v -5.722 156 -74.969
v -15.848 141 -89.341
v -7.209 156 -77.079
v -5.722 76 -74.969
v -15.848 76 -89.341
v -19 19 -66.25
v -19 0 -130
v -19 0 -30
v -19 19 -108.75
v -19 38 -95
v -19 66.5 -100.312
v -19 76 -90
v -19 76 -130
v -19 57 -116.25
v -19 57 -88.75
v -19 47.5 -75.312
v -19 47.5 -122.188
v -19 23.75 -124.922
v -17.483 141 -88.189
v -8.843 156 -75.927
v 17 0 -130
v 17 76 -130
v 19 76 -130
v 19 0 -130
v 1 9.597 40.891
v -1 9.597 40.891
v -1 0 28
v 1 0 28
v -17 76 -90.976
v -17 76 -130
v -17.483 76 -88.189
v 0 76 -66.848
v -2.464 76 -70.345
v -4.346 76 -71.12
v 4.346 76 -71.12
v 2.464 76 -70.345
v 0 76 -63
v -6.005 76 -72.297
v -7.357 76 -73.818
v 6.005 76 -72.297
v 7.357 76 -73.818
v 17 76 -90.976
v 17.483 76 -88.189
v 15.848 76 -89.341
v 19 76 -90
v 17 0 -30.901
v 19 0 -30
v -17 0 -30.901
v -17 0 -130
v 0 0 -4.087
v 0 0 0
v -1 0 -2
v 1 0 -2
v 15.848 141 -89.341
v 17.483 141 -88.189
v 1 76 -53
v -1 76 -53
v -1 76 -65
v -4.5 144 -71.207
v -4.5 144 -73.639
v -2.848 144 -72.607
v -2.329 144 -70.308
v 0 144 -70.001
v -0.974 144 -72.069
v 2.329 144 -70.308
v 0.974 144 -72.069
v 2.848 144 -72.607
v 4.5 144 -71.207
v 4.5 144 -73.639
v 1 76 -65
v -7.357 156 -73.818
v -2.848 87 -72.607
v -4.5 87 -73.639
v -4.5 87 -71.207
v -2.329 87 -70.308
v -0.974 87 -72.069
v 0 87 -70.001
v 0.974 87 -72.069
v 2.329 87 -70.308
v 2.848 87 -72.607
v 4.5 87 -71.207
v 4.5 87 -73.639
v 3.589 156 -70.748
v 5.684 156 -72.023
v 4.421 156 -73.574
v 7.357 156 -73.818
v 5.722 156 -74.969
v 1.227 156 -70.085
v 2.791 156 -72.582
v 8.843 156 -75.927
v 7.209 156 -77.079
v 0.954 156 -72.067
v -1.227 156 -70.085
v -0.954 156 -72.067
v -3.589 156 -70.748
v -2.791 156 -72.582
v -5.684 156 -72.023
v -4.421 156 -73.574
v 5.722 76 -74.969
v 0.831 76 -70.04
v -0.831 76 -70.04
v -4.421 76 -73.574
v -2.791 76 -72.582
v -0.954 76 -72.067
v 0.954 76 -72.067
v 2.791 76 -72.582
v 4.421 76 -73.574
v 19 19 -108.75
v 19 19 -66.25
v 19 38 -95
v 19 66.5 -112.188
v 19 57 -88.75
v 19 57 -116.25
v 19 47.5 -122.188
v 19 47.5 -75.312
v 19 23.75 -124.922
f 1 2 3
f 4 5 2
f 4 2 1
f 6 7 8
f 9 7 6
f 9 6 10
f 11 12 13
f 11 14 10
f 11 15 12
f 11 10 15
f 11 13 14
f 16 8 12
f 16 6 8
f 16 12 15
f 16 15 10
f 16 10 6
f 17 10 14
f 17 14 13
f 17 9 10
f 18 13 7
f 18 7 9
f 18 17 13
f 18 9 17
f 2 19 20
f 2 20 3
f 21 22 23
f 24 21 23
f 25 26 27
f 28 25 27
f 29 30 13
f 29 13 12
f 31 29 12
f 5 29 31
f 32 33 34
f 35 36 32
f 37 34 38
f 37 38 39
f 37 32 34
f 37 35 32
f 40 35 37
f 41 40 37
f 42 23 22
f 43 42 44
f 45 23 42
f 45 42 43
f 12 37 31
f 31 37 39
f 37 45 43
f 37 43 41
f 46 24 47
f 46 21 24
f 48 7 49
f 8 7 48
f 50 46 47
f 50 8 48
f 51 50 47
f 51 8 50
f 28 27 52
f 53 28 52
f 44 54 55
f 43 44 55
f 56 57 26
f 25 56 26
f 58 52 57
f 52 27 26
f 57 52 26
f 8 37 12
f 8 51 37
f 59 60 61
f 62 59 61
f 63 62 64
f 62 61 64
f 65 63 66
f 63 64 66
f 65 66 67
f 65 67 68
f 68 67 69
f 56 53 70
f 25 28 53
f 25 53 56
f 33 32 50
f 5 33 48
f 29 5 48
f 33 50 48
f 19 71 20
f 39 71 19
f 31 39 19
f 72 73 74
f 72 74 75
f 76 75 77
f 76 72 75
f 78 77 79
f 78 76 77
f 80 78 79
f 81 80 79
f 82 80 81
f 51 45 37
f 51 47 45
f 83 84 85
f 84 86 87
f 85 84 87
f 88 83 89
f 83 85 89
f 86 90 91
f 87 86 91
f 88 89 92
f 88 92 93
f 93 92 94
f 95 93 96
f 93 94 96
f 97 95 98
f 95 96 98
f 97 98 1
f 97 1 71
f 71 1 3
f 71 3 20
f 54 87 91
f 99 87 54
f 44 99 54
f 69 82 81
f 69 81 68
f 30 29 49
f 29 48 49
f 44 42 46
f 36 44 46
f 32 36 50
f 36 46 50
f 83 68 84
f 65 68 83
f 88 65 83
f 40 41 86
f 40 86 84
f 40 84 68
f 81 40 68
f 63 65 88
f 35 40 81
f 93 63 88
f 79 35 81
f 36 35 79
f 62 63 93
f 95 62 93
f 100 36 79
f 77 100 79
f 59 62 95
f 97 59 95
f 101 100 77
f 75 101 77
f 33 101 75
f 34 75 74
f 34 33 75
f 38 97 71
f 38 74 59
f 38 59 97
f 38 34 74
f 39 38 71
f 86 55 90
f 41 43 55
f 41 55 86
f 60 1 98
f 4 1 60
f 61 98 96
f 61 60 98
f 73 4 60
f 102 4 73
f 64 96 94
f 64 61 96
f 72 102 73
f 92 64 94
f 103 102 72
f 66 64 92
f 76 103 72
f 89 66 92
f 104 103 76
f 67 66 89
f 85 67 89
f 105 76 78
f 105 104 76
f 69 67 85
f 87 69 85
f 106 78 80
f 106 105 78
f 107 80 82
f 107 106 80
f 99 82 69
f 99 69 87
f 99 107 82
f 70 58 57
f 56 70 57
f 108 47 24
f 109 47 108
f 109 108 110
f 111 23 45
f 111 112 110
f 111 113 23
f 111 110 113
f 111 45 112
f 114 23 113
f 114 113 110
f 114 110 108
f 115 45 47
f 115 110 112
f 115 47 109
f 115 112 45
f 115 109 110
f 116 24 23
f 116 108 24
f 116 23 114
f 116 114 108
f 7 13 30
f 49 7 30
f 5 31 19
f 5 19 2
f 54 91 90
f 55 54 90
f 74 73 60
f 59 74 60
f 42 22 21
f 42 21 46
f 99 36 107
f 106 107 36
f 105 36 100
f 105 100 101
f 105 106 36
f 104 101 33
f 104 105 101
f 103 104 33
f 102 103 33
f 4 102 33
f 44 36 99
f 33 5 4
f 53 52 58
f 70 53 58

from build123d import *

# Parameters (mm, degrees)
SHELL_1_T                = -2
EXTRUDE_1_DEPTH          = 1
EXTRUDE_1_DEPTH_BACK     = 1
MOVE_START               = -1
MOVE_FACE_1_DEPTH        = 2
EXTRUDE_2_DEPTH          = 80
CHAMFER_1_SIZE           = 15
CUT_EXTRUDE_1_DEPTH      = 204.953426129
CUT_EXTRUDE_1_DEPTH_BACK = 204.953426129
SKETCH_5_W               = 9
SKETCH_5_H               = 57


# Read off the part's stored shape, not the designer's step: Переместить грань1
with BuildPart() as part:
    # Эскиз2 → По сечениям2 section 0
    with BuildSketch(Plane(origin=(0, 76, 0), x_dir=(1, 0, 0), z_dir=(0, 1, 0))):
        with BuildLine():
            Line((-19, 130), (19, 130))
            Line((19, 130), (19, 90))
            Line((19, 90), (0, 63))
            Line((0, 63), (-19, 90))
            Line((-19, 90), (-19, 130))
        make_face()
    # Эскиз1 → По сечениям2 section 1
    with BuildSketch(Plane(origin=(0, 0, 0), x_dir=(1, 0, 0), z_dir=(0, 1, 0))):
        with BuildLine():
            Line((0, 0), (19, 30))
            Line((19, 30), (19, 130))
            Line((19, 130), (-19, 130))
            Line((-19, 130), (-19, 30))
            Line((-19, 30), (0, 0))
        make_face()
    loft()

    # Оболочка1
    shell_1_openings = [part.faces().sort_by_distance(p)[0] for p in [
        (0, 0, -72.173913043),
        (0, 76, -102.682242991),
        (0, 38, -130),
    ]]
    offset(amount=SHELL_1_T, openings=shell_1_openings, kind=Kind.INTERSECTION)

    # Эскиз4 → Бобышка-Вытянуть2 (add)
    with BuildSketch(Plane(origin=(0, 76, 0), x_dir=(1, 0, 0), z_dir=(0, 1, 0))):
        with BuildLine():
            Line((5.722299686, 74.96948221), (15.84807873, 89.340970111))
            Line((15.84807873, 89.340970111), (17.483021498, 88.189031681))
            Line((17.483021498, 88.189031681), (7.357242454, 73.81754378))
            ThreePointArc((7.357242454, 73.81754378), (0, 70.001266716), (-7.357242454, 73.81754378))
            Line((-7.357242454, 73.81754378), (-17.483021498, 88.189031681))
            Line((-17.483021498, 88.189031681), (-15.84807873, 89.340970111))
            Line((-15.84807873, 89.340970111), (-5.722299686, 74.96948221))
            ThreePointArc((-5.722299686, 74.96948221), (0, 72.001266716), (5.722299686, 74.96948221))
        make_face()
    extrude(amount=EXTRUDE_2_DEPTH)

    # Фаска1
    chamfer_1_edges = [part.edges().sort_by_distance(p)[0] for p in [
        (-16.665550114, 156, -88.765000896),
        (16.665550114, 156, -88.765000896),
    ]]
    chamfer(chamfer_1_edges, length=CHAMFER_1_SIZE)

    # Эскиз5 → Вырез-Вытянуть1 (cut, two sides: drawn at the far end of the back side and taken through both)
    with BuildSketch(Plane.XY.offset(-CUT_EXTRUDE_1_DEPTH_BACK)):
        with Locations((0, 115.5)):
            Rectangle(SKETCH_5_W, SKETCH_5_H)
    extrude(amount=CUT_EXTRUDE_1_DEPTH + CUT_EXTRUDE_1_DEPTH_BACK, mode=Mode.SUBTRACT)


with BuildPart() as body_2:
    # Эскиз3 → Бобышка-Вытянуть1 (new, two sides: drawn at the far end of the back side and taken through both)
    with BuildSketch(Plane(origin=(0, 0, 0), x_dir=(0, 0, -1), z_dir=(1, 0, 0)).offset(-EXTRUDE_1_DEPTH_BACK)):
        Polygon((63, 76), (53, 76), (-40.891415979, 9.596671729), (-28, 0), (0, 0), align=None)
    extrude(amount=EXTRUDE_1_DEPTH + EXTRUDE_1_DEPTH_BACK)

    # Move Face 1 outline → Move Face 1 (add)
    with BuildSketch(Plane.YZ.offset(MOVE_START)):
        Polygon((0, 0), (0, -2), (76, -65), (76, -63), align=None)
    extrude(amount=MOVE_FACE_1_DEPTH)


solid = Compound([part.part, body_2.part])
